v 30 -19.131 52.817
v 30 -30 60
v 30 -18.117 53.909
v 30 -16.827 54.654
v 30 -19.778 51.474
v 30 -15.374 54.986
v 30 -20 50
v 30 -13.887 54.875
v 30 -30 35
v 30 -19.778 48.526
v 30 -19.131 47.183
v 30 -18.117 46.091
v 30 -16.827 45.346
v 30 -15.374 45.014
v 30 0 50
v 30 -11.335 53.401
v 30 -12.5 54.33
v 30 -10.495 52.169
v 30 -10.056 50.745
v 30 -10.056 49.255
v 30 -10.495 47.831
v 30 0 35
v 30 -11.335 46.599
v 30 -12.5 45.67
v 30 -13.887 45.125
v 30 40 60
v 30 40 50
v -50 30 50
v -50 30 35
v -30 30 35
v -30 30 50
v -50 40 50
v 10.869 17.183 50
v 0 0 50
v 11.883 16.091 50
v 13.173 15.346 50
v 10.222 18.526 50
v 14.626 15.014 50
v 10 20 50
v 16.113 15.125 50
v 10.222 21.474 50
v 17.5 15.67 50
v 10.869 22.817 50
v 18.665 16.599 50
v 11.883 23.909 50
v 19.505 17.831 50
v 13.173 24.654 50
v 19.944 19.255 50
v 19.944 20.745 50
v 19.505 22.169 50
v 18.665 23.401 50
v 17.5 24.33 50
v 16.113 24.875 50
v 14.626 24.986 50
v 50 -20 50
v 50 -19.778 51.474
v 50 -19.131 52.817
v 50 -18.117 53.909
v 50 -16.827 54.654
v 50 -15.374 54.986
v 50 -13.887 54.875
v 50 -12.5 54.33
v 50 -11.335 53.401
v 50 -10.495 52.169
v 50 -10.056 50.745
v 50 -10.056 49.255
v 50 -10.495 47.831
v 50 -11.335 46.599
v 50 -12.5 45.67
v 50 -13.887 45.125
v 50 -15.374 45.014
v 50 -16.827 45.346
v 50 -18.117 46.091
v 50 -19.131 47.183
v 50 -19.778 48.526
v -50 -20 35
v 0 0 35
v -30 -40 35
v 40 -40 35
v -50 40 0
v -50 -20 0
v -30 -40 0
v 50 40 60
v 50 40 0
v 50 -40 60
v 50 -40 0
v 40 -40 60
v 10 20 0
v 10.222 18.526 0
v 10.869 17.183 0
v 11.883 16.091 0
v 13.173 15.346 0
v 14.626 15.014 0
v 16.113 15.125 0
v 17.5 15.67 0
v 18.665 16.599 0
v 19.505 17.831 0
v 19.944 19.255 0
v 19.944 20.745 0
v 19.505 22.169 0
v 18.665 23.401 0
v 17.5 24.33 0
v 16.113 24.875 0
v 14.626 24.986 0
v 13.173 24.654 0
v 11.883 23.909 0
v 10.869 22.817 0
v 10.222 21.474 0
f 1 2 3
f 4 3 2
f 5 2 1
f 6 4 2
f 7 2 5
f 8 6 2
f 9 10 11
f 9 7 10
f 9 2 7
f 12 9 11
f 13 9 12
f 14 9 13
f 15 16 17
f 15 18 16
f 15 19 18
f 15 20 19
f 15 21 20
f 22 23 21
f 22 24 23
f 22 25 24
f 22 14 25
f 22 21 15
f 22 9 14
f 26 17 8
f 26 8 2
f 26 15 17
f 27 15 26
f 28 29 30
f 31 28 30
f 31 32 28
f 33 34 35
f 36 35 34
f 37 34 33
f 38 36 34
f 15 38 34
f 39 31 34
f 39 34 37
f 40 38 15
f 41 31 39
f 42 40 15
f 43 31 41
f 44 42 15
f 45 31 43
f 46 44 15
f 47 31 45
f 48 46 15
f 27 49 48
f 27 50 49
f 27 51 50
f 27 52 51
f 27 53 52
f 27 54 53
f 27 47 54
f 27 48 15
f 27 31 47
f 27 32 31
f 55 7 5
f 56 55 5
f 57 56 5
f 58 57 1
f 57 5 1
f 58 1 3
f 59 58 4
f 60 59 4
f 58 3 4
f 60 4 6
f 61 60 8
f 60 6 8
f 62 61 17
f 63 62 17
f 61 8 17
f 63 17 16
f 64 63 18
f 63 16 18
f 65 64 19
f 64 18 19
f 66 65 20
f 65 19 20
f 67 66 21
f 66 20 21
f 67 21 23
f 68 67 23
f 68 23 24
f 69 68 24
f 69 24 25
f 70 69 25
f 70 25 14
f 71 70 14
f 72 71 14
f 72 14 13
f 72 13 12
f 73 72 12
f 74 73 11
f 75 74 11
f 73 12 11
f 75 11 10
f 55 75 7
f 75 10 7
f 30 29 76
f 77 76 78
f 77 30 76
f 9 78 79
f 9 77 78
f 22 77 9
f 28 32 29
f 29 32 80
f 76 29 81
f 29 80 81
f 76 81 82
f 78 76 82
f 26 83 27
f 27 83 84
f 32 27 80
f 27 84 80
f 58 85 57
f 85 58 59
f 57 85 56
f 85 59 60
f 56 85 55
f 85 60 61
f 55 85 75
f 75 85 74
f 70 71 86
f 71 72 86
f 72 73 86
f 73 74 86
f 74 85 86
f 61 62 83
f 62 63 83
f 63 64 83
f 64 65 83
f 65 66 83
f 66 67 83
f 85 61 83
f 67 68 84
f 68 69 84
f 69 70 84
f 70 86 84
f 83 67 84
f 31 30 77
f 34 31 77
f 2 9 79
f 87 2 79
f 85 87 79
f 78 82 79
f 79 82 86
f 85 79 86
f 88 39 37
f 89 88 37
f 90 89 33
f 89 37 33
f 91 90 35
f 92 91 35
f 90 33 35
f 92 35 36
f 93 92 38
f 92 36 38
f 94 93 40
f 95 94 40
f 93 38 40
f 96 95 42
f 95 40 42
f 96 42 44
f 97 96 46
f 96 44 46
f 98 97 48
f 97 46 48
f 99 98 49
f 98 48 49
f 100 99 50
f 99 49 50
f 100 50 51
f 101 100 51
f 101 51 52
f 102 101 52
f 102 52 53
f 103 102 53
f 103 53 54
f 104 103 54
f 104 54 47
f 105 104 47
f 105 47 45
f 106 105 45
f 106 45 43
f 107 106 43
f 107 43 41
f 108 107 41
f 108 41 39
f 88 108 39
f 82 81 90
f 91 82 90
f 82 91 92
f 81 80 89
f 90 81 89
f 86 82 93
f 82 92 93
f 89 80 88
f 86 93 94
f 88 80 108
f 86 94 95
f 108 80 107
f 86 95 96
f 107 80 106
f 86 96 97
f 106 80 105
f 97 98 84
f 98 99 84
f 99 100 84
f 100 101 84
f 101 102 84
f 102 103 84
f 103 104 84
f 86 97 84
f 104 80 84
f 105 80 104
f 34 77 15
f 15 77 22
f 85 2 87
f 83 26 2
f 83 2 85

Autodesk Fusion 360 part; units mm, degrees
sketch "Sketch1" plane through (0, 0, 0) normal (0, 0, 1) x (1, 0, 0)
  line L0 (50, 40) -> (-50, 40)
  line L1 (-50, 40) -> (-50, -20)
  line L2 (-30, -40) -> (50, -40)
  line L3 (50, -40) -> (50, 40)
  line L4 (-50, -20) -> (-30, -40)
  line L5 (-50, 40) -> (-50, 30)
  line L6 (-50, 30) -> (-30, 30)
  line L7 (-30, 30) -> (0, 0)
  line L8 (30, 0) -> (30, 40)
  line L9 (30, -30) -> (40, -40)
  line L10 (30, 0) -> (30, -30)
  line L11 (0, 0) -> (30, 0)
extrude "Extrude1" add sketch "Sketch1" along normal blind 60 contours L0 L2 L3 L8 L9 L10
extrude "Extrude2" add sketch "Sketch1" along normal blind 50 contours L0 L1 L5 L6 L7 L8 L11
extrude "Extrude3" add sketch "Sketch1" along normal blind 35 contours L1 L2 L4 L6 L7 L9 L10 L11
sketch "Sketch4" plane through (0, 0, 50) normal (0, 0, 1) x (-1, 0, 0)
  line L0 (0, 0) -> (-30, 0)
  line L1 (-30, 0) -> (-30, -40)
  line L2 (-30, -40) -> (50, -40)
  line L3 (50, -40) -> (50, -30)
  line L4 (50, -30) -> (30, -30)
  line L5 (30, -30) -> (0, 0)
  circle A0 centre (-15, -20) radius 5
sketch "Sketch5" plane through (30, 0, 0) normal (-1, 0, 0) x (0, -1, 0)
  line L0 (0, 35) -> (30, 35)
  line L1 (30, 35) -> (30, 60)
  line L2 (30, 60) -> (-40, 60)
  line L3 (-40, 60) -> (-40, 50)
  line L4 (-40, 50) -> (0, 50)
  line L5 (0, 50) -> (0, 35)
  circle A0 centre (15, 50) radius 5
extrude "Extrude4" cut sketch "Sketch4" against normal blind 50 contours A0
extrude "Extrude5" cut sketch "Sketch5" against normal blind 20 contours A0
